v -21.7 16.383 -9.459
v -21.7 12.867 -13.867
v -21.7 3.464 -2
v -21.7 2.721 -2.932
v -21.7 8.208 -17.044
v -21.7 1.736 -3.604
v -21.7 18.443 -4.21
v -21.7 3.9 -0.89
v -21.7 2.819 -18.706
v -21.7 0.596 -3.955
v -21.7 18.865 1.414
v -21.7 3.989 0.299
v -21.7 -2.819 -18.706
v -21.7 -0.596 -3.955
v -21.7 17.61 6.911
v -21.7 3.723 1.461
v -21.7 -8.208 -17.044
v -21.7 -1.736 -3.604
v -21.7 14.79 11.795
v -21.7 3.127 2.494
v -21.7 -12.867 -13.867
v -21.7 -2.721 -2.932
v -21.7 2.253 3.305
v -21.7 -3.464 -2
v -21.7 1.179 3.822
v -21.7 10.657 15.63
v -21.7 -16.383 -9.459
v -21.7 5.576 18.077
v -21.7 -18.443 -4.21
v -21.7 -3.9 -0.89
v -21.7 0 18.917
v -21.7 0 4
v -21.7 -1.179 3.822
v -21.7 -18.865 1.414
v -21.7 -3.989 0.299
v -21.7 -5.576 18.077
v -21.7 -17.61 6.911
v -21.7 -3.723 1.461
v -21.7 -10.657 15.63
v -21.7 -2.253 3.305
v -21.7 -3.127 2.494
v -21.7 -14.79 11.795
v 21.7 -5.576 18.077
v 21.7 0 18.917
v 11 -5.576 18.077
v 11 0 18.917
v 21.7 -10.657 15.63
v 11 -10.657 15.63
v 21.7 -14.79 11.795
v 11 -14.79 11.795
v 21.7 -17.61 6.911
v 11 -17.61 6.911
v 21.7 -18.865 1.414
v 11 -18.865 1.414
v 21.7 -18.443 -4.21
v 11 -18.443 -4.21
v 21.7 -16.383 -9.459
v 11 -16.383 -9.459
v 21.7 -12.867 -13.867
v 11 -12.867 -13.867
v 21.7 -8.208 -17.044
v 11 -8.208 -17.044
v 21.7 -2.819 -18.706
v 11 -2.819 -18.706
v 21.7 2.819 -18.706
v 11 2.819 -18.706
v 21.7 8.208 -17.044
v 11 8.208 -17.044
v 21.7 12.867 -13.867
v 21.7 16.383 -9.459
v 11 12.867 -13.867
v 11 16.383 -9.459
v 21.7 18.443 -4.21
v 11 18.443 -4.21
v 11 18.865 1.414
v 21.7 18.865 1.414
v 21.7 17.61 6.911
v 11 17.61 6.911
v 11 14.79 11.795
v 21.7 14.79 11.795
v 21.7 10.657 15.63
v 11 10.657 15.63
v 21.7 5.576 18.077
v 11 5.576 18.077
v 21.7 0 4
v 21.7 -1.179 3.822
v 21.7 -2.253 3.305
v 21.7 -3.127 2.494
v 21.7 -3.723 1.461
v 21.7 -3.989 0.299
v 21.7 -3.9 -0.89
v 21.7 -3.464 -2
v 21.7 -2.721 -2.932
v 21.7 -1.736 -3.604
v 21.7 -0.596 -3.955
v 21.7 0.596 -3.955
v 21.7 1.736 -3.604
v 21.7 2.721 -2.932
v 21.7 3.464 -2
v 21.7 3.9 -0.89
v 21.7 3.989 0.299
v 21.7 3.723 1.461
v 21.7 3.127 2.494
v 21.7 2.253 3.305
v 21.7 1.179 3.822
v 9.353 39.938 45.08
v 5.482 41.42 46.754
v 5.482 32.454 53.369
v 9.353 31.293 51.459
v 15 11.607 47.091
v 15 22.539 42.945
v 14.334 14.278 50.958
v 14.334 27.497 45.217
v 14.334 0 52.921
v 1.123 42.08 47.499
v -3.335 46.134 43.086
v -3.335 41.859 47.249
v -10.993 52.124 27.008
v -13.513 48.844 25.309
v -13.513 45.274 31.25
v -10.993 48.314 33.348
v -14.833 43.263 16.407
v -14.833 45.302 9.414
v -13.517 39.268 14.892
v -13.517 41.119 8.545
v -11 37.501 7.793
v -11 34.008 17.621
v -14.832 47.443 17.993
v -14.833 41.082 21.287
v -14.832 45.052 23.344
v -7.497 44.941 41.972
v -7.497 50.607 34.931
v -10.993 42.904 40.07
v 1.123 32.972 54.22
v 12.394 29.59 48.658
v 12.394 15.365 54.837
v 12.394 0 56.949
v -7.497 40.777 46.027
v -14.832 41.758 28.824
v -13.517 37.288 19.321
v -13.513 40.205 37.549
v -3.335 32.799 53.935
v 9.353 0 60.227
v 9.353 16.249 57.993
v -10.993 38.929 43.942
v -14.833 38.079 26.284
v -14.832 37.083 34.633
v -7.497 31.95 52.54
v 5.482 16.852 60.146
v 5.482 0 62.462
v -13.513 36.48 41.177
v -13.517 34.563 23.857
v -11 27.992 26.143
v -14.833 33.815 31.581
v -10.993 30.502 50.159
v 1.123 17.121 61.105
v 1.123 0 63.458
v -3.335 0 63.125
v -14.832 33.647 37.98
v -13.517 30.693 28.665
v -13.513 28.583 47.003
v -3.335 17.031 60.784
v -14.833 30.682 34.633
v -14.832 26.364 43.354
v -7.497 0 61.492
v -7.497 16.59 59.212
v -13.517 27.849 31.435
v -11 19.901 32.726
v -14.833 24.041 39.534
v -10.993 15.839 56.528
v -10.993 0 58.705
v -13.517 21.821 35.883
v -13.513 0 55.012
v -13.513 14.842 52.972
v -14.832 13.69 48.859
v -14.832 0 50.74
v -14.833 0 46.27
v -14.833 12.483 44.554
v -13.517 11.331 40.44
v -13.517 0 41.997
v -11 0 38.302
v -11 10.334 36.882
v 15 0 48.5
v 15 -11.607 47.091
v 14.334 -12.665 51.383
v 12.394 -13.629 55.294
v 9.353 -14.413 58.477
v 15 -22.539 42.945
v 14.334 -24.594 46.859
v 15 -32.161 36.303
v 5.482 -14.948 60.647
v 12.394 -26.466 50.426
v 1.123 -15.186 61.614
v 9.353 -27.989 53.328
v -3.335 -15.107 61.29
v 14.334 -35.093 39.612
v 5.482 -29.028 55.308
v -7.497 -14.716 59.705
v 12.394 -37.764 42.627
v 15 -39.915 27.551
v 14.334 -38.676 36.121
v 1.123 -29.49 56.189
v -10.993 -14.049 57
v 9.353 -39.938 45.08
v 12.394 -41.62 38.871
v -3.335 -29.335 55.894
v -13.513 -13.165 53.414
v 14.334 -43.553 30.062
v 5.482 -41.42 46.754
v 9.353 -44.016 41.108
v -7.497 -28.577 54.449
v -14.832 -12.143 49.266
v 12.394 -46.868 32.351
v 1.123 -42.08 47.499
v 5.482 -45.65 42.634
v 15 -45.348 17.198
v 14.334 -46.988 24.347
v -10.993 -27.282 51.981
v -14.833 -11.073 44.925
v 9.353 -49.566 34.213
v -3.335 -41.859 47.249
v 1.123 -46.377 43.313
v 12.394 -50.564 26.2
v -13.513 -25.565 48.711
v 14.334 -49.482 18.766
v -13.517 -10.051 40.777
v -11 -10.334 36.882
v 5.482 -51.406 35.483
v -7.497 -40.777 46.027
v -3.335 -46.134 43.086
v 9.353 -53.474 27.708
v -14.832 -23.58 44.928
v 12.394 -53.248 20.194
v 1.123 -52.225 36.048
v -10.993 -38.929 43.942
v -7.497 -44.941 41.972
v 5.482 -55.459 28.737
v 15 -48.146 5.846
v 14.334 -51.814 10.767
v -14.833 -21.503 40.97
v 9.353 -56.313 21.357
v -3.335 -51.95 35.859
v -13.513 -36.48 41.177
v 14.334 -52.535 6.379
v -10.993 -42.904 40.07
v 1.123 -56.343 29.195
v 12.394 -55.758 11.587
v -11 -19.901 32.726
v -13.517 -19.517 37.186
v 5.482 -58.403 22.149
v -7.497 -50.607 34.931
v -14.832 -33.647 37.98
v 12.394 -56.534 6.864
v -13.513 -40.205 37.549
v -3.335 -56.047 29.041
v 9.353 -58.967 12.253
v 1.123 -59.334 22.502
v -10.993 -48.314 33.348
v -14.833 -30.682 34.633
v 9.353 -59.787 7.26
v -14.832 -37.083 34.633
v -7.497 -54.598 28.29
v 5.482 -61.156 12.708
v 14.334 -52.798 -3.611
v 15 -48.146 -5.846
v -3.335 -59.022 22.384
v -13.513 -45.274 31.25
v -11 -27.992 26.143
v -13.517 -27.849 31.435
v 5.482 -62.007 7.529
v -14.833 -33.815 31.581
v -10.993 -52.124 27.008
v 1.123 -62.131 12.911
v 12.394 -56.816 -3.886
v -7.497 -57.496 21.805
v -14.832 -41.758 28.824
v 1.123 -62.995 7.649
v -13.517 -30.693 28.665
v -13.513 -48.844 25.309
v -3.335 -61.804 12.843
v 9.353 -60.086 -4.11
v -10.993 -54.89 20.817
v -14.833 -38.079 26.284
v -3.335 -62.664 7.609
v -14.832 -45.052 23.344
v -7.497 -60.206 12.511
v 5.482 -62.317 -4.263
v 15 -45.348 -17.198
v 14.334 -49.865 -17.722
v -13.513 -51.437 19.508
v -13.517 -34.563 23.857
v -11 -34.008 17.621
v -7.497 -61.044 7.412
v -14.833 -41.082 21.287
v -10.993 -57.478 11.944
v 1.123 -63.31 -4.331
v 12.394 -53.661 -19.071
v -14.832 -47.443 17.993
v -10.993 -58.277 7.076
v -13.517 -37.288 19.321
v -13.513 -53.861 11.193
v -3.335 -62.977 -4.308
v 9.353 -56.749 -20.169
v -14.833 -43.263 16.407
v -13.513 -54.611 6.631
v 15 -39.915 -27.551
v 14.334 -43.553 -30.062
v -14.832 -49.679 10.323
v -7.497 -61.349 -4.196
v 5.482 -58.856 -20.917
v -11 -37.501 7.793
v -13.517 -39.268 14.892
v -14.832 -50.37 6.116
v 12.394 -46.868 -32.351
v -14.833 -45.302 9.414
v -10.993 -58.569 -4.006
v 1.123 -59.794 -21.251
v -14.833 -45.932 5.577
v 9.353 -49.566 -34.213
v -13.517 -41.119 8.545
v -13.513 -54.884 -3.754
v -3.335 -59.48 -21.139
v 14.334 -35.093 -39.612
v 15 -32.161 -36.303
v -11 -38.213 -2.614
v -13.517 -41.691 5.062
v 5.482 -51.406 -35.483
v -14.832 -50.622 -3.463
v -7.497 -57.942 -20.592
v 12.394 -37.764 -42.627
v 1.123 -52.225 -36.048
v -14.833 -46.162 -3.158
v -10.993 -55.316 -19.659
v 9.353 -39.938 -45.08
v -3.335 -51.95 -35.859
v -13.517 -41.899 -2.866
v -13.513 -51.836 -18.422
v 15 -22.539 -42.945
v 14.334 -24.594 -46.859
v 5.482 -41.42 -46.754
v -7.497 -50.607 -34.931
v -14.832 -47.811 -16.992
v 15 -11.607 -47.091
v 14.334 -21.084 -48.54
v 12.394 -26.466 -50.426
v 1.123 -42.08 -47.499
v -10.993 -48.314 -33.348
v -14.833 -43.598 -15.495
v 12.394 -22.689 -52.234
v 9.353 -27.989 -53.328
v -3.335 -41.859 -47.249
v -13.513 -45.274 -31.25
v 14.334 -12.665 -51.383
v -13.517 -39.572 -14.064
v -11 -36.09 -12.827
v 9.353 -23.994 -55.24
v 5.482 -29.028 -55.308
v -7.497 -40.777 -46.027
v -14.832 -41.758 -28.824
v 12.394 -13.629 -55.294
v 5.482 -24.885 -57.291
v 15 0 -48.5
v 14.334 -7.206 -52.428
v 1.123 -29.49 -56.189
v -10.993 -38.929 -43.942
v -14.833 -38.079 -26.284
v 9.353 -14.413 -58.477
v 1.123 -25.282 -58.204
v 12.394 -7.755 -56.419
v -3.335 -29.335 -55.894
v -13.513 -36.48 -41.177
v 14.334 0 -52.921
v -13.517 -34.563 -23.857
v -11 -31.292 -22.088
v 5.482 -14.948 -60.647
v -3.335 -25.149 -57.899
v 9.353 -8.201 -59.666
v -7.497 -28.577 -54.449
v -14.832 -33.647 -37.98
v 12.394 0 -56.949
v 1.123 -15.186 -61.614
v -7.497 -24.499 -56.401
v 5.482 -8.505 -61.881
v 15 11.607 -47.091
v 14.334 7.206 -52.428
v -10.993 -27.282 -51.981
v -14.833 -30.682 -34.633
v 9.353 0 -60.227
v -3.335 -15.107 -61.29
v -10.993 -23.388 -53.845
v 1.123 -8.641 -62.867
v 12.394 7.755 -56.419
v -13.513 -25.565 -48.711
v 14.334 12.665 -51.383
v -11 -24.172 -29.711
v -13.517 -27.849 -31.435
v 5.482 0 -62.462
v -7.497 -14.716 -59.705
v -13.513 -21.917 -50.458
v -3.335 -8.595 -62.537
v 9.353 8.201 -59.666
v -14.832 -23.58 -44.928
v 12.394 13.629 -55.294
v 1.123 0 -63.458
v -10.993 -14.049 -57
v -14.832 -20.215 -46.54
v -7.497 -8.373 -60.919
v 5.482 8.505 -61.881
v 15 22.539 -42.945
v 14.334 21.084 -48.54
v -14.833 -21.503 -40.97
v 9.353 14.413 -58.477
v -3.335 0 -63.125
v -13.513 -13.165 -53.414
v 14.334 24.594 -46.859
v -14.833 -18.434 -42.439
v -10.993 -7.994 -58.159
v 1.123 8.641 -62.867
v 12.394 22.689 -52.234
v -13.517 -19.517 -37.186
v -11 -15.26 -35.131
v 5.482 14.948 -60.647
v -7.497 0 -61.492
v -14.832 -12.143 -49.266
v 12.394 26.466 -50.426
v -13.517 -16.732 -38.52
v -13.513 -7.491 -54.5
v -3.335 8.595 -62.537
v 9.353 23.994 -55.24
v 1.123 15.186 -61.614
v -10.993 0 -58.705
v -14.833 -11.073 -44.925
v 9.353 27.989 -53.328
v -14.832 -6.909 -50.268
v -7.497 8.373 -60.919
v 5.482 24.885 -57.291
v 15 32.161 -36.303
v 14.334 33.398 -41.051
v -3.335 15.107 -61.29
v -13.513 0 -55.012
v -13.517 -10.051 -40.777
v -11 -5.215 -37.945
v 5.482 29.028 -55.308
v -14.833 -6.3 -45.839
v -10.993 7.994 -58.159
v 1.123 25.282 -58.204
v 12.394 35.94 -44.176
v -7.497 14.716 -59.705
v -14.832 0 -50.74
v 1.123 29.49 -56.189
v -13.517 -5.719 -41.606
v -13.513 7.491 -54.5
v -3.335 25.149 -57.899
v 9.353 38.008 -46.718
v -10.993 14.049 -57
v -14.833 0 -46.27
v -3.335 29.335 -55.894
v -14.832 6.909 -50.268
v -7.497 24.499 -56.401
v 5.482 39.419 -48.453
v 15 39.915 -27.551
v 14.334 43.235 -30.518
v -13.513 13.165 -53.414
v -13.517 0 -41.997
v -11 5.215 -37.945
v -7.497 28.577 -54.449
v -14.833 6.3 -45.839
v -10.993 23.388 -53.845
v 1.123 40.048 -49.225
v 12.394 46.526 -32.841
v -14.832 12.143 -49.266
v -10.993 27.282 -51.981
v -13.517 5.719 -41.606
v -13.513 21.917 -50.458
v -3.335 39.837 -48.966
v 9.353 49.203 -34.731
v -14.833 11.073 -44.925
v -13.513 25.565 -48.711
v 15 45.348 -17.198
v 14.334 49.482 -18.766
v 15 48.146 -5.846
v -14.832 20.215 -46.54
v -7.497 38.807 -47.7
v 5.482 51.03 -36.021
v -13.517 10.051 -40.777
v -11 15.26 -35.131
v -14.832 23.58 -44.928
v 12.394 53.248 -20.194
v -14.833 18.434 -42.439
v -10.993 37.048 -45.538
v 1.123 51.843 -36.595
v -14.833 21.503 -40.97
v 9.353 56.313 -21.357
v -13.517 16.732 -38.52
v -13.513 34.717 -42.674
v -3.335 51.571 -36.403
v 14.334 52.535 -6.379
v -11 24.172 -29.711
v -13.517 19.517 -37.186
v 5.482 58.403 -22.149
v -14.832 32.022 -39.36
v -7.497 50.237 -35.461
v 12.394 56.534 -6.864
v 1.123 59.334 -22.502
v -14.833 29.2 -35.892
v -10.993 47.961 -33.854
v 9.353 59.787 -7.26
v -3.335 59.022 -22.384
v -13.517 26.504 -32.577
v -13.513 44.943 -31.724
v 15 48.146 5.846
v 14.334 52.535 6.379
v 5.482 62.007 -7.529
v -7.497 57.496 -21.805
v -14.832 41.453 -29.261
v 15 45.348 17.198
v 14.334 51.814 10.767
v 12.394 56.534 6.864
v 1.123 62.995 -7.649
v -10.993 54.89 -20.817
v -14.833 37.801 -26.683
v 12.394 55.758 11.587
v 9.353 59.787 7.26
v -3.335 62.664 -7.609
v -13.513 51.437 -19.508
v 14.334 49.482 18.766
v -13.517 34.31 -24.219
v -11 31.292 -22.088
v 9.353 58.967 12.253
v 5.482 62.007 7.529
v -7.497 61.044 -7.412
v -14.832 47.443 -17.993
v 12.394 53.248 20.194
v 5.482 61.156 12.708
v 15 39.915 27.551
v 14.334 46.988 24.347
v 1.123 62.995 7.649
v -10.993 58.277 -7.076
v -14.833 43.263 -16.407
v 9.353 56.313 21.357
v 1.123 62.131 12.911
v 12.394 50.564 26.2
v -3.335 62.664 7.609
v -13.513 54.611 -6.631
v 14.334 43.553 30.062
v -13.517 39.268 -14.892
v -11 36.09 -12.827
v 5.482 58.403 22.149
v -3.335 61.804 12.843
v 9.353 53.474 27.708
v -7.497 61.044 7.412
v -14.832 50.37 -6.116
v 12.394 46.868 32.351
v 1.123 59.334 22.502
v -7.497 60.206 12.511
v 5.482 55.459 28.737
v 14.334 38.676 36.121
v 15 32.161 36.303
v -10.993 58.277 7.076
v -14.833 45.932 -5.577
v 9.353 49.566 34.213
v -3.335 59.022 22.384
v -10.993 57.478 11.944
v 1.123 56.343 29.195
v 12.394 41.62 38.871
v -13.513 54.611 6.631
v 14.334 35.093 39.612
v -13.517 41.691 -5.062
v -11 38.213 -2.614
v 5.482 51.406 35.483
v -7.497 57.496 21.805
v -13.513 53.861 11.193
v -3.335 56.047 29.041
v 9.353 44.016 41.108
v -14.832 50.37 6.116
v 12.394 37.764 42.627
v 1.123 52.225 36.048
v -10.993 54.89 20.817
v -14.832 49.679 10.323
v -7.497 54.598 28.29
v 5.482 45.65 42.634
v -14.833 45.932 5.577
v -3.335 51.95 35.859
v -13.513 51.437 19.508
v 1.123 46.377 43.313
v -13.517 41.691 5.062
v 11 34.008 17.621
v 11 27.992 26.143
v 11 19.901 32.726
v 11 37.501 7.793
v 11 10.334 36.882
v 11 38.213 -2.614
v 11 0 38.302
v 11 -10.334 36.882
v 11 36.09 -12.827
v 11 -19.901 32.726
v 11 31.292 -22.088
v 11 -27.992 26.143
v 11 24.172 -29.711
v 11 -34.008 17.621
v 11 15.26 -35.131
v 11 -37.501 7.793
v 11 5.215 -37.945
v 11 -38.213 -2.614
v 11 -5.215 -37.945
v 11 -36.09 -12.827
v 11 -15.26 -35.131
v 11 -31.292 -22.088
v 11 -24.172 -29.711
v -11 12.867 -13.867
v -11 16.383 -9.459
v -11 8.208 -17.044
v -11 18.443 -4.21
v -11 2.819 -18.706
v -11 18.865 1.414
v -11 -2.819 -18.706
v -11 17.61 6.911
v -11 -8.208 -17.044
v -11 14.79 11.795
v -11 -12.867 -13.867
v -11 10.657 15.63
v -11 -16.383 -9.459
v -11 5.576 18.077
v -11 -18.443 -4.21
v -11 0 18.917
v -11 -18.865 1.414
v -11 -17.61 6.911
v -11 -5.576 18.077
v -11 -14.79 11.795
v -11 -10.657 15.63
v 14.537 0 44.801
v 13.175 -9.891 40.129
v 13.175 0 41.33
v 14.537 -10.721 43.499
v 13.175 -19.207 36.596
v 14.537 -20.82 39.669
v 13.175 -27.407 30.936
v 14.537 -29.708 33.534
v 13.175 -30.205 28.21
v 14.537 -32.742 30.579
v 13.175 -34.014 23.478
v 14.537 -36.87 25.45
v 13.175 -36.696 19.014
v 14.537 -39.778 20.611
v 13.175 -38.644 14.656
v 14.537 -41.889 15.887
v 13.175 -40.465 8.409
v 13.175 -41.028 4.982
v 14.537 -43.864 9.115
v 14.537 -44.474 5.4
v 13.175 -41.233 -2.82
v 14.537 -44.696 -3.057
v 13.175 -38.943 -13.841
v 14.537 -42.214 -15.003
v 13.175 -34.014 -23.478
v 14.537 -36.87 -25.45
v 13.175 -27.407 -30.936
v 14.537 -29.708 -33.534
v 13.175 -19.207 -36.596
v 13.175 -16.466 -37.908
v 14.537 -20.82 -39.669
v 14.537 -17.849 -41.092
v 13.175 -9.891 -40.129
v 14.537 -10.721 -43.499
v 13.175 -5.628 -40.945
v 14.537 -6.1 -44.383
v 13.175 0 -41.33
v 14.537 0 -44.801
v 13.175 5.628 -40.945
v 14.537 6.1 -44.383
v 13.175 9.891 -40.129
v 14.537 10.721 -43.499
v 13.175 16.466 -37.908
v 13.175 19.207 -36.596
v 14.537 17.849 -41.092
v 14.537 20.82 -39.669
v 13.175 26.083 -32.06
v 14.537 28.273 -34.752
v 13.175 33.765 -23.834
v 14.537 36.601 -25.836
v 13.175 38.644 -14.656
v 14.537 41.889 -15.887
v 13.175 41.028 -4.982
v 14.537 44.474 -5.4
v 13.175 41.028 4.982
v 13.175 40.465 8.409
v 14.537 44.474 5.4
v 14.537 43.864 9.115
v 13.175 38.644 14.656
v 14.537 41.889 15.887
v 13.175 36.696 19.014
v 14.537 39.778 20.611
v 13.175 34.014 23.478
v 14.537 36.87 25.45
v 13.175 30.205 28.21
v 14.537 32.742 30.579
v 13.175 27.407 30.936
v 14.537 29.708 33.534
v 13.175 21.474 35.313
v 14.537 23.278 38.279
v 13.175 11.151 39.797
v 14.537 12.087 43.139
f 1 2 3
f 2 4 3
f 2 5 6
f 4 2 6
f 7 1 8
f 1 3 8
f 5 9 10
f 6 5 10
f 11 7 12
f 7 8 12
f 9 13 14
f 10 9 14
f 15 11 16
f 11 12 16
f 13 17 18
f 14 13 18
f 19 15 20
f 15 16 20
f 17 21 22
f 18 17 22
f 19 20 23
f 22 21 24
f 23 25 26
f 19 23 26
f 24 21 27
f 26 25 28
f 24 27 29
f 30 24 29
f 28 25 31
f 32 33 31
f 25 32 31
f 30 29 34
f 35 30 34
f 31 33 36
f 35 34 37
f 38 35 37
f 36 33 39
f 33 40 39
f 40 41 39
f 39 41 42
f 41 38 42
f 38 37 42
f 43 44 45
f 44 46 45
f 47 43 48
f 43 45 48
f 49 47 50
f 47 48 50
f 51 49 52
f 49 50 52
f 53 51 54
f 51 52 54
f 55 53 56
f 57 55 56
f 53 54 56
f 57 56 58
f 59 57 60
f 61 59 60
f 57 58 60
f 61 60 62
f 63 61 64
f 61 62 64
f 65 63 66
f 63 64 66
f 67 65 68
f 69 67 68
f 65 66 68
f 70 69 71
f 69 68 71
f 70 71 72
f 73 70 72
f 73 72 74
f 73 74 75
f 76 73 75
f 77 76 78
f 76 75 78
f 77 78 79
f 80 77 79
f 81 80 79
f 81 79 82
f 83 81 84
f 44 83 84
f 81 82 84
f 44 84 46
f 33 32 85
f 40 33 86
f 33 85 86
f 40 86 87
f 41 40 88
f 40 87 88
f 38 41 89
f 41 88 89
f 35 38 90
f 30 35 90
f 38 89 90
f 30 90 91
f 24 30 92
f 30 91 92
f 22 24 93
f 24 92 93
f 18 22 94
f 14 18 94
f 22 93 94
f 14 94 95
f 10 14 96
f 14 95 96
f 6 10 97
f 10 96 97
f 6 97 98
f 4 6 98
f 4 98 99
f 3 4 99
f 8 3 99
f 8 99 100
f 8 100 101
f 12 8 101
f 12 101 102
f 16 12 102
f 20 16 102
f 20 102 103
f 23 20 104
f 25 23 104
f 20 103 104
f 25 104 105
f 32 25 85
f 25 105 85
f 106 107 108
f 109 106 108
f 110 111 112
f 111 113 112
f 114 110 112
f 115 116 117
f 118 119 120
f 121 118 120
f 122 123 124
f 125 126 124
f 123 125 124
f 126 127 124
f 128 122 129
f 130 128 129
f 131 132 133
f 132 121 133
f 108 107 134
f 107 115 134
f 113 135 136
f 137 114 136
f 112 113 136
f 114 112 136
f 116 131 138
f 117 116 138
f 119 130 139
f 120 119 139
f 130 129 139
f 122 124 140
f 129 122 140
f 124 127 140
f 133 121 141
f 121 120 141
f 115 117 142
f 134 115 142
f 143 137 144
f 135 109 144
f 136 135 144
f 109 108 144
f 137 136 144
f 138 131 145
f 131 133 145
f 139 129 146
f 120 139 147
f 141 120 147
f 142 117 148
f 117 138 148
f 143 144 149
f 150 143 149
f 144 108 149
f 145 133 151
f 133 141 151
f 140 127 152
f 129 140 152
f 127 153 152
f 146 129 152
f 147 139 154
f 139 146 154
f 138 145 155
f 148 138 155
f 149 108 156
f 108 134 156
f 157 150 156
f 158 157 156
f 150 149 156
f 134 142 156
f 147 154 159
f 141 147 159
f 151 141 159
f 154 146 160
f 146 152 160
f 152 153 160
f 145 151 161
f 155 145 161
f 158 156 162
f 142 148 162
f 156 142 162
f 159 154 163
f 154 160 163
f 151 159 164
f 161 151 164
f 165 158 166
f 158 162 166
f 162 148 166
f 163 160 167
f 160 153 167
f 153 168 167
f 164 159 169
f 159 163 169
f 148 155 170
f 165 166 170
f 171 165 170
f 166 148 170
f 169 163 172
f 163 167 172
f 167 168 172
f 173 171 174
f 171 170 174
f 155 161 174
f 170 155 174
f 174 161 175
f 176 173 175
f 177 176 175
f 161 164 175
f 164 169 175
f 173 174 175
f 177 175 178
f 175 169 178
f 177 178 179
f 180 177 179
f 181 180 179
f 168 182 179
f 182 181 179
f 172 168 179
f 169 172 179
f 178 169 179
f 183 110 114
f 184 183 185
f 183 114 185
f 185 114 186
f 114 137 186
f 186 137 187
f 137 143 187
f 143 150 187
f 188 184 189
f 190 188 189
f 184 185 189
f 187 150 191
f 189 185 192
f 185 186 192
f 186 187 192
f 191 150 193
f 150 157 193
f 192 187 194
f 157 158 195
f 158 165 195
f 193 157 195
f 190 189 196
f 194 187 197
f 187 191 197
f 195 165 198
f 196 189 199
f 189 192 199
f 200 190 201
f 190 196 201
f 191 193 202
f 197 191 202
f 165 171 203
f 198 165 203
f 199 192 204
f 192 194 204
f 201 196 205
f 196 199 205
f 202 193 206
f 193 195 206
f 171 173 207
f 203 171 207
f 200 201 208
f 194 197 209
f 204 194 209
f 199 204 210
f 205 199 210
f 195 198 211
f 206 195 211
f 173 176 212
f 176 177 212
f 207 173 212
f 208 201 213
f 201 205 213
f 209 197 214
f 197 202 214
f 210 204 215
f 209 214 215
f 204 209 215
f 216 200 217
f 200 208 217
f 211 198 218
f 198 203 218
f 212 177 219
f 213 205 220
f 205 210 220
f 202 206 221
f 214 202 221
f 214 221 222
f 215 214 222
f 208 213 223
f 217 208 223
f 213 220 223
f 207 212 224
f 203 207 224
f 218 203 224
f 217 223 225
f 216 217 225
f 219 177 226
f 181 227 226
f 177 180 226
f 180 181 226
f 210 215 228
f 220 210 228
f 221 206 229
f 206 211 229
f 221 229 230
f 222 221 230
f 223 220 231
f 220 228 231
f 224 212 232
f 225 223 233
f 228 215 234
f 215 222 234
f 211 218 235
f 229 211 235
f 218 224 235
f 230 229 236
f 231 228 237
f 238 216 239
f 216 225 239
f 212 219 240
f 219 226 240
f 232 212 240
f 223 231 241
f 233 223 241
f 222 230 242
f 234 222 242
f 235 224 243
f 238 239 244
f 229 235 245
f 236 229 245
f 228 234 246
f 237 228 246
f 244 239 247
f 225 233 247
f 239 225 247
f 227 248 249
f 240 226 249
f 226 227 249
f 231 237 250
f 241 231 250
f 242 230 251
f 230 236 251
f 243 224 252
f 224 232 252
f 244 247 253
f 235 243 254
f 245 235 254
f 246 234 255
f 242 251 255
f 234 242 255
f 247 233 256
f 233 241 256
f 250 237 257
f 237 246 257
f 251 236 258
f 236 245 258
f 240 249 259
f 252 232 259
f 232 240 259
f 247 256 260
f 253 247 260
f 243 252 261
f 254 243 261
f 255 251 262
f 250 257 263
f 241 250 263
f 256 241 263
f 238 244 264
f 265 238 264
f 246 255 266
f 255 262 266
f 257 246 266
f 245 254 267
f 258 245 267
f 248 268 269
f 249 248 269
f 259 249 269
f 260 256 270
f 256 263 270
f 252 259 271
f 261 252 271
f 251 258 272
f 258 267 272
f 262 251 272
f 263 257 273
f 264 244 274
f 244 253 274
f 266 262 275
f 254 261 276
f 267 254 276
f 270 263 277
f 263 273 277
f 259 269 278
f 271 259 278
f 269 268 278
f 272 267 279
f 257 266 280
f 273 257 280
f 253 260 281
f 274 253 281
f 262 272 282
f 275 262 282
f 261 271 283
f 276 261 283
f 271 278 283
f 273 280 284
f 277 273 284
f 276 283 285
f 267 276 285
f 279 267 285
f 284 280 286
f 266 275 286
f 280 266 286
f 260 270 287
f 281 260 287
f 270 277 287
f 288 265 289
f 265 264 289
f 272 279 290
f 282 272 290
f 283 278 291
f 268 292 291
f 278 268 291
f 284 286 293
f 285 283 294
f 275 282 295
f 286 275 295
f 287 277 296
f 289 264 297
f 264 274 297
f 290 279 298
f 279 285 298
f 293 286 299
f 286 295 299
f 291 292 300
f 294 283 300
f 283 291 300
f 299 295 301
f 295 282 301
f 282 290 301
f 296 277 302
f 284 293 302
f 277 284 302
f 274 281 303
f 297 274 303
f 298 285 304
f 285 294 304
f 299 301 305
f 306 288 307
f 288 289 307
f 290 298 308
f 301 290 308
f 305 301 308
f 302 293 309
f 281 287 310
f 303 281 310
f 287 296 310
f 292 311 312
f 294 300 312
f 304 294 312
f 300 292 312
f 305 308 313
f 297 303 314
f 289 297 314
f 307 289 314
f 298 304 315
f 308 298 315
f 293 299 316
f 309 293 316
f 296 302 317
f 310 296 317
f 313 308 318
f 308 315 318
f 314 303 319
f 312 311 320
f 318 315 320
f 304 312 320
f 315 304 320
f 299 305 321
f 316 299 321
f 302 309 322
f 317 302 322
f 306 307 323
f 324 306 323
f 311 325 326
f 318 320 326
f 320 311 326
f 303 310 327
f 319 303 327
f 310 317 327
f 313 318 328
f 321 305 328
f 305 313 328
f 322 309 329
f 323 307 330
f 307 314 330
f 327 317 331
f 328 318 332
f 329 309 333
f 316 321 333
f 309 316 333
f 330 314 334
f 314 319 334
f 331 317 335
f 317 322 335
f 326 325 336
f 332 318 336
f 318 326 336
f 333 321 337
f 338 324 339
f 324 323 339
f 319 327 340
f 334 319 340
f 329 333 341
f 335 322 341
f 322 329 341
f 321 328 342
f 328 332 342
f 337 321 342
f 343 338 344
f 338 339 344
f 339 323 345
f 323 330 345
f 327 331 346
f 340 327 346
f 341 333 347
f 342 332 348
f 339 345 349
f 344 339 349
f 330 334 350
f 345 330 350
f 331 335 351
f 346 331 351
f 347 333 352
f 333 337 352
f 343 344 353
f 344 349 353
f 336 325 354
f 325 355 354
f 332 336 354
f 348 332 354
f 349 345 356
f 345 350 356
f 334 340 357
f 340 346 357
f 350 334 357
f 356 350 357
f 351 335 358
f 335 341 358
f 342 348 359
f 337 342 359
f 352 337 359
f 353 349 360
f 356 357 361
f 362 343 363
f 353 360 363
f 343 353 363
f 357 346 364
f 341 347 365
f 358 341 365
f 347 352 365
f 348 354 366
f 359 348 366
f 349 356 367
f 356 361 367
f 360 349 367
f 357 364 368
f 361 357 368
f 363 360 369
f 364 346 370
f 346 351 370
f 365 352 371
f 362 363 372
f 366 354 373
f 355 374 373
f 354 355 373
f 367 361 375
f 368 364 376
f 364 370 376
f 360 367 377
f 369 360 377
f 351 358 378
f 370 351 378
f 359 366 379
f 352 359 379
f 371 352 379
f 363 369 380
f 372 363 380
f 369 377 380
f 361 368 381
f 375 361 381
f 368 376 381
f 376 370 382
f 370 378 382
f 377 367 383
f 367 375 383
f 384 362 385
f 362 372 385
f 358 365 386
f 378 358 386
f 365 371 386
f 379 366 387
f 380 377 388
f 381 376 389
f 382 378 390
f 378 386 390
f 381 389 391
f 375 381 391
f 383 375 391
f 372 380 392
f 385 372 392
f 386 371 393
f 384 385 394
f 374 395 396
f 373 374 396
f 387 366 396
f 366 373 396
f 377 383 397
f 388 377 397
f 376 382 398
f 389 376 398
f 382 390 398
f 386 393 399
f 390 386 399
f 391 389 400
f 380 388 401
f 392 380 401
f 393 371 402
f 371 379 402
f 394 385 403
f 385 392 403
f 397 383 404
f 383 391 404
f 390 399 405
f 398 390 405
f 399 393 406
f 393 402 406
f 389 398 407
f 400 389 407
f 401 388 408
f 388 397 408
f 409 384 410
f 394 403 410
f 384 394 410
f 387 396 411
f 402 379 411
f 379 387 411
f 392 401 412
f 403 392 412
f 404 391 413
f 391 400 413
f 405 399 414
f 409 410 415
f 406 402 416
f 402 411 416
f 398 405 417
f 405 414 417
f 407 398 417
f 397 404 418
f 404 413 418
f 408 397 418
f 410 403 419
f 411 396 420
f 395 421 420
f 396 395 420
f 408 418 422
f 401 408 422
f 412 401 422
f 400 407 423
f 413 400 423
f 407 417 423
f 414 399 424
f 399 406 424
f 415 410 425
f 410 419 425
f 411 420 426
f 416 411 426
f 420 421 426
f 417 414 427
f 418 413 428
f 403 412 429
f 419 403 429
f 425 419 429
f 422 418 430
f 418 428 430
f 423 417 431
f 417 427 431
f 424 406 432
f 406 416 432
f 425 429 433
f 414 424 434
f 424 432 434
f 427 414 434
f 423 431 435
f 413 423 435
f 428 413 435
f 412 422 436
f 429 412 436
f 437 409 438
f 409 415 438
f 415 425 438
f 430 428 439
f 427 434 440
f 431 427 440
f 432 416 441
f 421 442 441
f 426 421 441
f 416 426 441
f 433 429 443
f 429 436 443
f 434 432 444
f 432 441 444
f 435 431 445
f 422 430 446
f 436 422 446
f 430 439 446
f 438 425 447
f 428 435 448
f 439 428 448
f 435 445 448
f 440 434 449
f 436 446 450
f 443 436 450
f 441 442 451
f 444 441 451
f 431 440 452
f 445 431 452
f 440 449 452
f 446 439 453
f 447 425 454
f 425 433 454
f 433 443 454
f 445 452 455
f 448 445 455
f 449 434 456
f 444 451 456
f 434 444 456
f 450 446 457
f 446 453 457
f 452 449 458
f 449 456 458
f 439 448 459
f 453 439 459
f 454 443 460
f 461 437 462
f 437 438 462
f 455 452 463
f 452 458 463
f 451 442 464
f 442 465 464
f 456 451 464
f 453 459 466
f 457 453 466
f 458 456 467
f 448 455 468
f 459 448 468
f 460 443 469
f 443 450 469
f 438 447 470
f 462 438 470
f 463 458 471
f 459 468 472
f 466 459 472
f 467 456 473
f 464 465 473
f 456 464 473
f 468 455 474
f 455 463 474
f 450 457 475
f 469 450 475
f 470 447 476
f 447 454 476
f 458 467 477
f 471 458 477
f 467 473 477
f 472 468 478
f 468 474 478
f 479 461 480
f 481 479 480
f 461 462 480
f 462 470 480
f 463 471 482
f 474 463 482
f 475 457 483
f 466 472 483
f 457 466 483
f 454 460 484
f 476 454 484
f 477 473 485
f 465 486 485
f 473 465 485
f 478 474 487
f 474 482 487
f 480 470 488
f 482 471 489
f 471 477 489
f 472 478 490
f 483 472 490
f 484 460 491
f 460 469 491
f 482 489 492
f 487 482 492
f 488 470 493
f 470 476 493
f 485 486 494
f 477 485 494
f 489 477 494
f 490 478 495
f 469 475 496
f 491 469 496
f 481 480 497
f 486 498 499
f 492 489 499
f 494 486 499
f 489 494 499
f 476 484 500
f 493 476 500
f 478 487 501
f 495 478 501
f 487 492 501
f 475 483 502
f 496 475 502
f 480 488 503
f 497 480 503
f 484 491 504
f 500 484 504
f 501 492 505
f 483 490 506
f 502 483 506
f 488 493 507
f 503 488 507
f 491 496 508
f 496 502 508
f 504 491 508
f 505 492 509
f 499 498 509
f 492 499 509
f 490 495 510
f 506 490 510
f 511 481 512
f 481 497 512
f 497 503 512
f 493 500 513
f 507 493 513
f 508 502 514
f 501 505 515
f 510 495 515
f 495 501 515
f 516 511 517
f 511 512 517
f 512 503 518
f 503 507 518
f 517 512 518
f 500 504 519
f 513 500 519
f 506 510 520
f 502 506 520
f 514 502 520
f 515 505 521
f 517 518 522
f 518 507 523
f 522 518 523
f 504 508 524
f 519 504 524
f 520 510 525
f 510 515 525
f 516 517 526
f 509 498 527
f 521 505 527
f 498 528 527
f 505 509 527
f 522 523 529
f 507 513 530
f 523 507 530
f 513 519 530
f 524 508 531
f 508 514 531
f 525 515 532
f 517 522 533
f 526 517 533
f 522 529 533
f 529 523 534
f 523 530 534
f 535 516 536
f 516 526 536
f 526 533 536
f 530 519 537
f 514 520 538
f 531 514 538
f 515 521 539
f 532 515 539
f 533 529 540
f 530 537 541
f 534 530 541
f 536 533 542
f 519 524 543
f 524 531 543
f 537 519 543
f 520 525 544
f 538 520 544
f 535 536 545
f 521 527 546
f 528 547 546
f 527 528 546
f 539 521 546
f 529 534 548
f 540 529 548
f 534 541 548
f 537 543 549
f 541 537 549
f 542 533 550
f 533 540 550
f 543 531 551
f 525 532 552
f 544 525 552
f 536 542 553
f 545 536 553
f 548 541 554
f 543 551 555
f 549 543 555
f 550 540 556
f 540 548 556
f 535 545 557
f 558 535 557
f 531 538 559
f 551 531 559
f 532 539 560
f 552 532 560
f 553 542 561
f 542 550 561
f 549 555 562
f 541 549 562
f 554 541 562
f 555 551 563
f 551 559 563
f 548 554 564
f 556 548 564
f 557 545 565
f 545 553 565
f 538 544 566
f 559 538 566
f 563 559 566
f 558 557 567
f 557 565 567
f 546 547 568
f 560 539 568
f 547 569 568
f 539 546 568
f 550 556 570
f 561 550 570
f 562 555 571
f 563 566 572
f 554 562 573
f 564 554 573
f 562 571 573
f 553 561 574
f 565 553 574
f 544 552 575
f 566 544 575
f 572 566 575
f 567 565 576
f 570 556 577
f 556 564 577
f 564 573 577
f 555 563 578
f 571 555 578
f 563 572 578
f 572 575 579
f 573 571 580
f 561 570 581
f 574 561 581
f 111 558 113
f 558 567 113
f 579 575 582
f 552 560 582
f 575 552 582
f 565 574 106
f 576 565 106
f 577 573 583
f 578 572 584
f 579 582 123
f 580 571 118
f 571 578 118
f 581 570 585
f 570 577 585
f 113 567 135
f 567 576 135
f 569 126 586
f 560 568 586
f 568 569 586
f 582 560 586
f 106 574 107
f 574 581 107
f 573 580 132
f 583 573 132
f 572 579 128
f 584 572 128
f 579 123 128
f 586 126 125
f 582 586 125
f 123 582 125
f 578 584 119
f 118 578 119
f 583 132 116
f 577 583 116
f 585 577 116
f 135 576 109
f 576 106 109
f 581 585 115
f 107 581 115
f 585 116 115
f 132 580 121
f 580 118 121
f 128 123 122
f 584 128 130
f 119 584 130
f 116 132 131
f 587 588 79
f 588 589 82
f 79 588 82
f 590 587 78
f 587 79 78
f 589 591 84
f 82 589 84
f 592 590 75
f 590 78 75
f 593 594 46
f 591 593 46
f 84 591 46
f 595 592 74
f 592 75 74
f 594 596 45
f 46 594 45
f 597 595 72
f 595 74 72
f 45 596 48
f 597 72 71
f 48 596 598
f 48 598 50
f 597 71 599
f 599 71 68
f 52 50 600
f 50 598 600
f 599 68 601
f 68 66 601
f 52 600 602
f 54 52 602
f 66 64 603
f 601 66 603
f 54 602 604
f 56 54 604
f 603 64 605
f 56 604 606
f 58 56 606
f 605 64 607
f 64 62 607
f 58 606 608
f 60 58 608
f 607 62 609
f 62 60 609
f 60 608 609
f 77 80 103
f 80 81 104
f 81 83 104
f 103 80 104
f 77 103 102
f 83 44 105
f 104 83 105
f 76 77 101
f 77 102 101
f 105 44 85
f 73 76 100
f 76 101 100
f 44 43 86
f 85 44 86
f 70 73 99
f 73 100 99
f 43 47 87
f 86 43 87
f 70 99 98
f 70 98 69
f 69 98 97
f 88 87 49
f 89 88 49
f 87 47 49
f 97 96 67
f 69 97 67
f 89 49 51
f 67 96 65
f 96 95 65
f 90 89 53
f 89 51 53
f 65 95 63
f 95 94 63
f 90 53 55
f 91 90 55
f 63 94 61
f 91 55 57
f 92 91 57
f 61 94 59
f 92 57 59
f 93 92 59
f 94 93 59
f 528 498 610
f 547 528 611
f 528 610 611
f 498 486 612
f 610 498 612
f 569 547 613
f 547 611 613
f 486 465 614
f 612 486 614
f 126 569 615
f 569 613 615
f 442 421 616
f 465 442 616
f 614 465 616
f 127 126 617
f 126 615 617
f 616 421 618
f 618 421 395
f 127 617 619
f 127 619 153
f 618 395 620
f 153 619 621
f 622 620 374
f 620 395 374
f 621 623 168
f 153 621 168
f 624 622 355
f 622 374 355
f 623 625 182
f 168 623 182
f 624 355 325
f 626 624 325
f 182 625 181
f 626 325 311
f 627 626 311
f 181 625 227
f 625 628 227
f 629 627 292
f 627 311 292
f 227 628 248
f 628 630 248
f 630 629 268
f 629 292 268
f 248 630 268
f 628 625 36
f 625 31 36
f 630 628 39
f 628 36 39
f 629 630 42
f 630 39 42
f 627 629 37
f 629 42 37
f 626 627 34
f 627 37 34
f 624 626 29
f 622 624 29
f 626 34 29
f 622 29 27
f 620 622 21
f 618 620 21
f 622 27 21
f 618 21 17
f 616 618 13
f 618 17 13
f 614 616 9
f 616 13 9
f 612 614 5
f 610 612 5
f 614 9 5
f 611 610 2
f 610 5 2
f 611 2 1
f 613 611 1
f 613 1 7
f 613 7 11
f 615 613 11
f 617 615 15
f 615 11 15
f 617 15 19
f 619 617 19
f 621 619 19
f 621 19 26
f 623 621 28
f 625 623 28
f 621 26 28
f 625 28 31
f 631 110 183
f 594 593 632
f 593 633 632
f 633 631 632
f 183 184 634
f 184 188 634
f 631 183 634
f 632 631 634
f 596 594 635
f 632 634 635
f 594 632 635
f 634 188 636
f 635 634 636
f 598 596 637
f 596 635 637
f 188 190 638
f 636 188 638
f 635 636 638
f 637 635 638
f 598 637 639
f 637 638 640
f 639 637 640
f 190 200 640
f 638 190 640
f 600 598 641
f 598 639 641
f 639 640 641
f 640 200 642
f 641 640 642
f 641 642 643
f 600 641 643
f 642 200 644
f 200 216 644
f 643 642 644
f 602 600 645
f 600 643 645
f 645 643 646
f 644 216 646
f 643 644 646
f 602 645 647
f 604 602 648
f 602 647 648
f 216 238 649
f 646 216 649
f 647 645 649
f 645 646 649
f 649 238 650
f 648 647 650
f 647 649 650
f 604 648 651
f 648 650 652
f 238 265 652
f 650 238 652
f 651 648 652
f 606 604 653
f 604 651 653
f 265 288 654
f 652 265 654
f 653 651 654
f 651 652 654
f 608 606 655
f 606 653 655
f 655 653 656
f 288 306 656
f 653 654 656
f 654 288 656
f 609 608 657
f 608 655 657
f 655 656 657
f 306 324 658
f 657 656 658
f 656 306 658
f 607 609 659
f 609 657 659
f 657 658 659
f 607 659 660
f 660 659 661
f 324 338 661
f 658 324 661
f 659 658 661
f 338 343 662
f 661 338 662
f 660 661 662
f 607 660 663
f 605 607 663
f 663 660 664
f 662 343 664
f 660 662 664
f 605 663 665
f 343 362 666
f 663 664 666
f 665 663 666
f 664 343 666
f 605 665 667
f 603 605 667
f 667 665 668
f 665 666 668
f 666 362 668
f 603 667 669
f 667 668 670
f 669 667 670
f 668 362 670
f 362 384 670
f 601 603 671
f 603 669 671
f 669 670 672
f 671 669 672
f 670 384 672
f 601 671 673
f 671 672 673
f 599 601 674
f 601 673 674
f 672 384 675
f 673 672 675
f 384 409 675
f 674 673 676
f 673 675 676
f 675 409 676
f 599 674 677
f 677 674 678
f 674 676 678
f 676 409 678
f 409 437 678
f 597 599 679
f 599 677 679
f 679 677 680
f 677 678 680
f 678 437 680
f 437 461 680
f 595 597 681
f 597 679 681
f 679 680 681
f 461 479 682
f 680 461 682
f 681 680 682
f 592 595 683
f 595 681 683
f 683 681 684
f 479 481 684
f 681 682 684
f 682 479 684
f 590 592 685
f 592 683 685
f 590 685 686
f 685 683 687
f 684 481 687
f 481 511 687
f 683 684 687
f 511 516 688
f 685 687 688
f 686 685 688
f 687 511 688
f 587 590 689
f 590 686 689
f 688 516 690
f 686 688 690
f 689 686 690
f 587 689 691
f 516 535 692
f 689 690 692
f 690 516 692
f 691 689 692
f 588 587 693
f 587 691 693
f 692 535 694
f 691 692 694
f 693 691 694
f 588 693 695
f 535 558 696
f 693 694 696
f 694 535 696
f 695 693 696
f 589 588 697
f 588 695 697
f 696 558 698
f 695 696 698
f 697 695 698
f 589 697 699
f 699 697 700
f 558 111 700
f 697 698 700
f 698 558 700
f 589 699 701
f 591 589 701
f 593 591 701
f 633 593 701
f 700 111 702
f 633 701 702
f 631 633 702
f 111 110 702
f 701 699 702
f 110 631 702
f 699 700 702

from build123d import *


with BuildPart() as f1:
    # F0 (on Front) → F1 (revolve)
    with BuildSketch(Plane.XZ):
        with BuildLine():
            Line((-21.7, 18.917404), (-21.7, 4))
            Line((-21.7, 4), (21.7, 4))
            Line((21.7, 4), (21.7, 18.917404))
            Line((21.7, 18.917404), (15, 18.917404))
            Line((15, 18.917404), (11, 18.917404))
            Line((11, 18.917404), (11, 38.301961))
            ThreePointArc((11, 38.301961), (0, 33.5), (-11, 38.301961))
            Line((-11, 38.301961), (-11, 18.917404))
            Line((-11, 18.917404), (-15, 18.917404))
            Line((-15, 18.917404), (-21.7, 18.917404))
        make_face()
        with BuildLine():
            ThreePointArc((15, 48.5), (-5.477226, 62.46424), (-11, 38.301961))
            ThreePointArc((-11, 38.301961), (0, 33.5), (11, 38.301961))
            ThreePointArc((11, 38.301961), (13.96424, 43.022774), (15, 48.5))
        make_face()
    revolve(axis=Axis((0, 0, 0), (1, 0, 0)))


solid = f1.part
